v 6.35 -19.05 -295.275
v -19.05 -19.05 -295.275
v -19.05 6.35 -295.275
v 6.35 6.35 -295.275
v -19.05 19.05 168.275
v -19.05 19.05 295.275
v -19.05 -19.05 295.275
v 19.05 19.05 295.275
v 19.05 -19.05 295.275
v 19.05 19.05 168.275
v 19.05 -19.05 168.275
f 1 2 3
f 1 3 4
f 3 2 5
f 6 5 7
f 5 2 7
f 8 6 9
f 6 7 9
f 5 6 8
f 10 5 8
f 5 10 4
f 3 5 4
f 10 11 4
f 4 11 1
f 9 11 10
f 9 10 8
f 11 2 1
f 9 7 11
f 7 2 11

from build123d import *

# Parameters (mm, degrees)
F0_W     = 38.1
F0_H     = 590.55
F1_DEPTH = 19.05
F3_DEPTH = 38.1
F5_DEPTH = 38.101


with BuildPart() as f1:
    # F0 (on Front) → F1 (new body, symmetric)
    with BuildSketch(Plane.XZ):
        Rectangle(F0_W, F0_H)
    extrude(amount=F1_DEPTH, both=True)

    # F2 (on face) → F3 (cut, through all)
    with BuildSketch(Plane.XZ.offset(19.05)):
        Polygon((19.05, 168.275), (6.35, -295.275), (19.05, -295.275), align=None)
    extrude(amount=-F3_DEPTH, mode=Mode.SUBTRACT)

    # F4 (on face) → F5 (cut, through all)
    with BuildSketch(Plane.YZ.offset(19.05)):
        Polygon((19.05, -295.275), (19.05, 168.275), (6.35, -295.275), align=None)
    extrude(amount=-F5_DEPTH, mode=Mode.SUBTRACT)


solid = f1.part
